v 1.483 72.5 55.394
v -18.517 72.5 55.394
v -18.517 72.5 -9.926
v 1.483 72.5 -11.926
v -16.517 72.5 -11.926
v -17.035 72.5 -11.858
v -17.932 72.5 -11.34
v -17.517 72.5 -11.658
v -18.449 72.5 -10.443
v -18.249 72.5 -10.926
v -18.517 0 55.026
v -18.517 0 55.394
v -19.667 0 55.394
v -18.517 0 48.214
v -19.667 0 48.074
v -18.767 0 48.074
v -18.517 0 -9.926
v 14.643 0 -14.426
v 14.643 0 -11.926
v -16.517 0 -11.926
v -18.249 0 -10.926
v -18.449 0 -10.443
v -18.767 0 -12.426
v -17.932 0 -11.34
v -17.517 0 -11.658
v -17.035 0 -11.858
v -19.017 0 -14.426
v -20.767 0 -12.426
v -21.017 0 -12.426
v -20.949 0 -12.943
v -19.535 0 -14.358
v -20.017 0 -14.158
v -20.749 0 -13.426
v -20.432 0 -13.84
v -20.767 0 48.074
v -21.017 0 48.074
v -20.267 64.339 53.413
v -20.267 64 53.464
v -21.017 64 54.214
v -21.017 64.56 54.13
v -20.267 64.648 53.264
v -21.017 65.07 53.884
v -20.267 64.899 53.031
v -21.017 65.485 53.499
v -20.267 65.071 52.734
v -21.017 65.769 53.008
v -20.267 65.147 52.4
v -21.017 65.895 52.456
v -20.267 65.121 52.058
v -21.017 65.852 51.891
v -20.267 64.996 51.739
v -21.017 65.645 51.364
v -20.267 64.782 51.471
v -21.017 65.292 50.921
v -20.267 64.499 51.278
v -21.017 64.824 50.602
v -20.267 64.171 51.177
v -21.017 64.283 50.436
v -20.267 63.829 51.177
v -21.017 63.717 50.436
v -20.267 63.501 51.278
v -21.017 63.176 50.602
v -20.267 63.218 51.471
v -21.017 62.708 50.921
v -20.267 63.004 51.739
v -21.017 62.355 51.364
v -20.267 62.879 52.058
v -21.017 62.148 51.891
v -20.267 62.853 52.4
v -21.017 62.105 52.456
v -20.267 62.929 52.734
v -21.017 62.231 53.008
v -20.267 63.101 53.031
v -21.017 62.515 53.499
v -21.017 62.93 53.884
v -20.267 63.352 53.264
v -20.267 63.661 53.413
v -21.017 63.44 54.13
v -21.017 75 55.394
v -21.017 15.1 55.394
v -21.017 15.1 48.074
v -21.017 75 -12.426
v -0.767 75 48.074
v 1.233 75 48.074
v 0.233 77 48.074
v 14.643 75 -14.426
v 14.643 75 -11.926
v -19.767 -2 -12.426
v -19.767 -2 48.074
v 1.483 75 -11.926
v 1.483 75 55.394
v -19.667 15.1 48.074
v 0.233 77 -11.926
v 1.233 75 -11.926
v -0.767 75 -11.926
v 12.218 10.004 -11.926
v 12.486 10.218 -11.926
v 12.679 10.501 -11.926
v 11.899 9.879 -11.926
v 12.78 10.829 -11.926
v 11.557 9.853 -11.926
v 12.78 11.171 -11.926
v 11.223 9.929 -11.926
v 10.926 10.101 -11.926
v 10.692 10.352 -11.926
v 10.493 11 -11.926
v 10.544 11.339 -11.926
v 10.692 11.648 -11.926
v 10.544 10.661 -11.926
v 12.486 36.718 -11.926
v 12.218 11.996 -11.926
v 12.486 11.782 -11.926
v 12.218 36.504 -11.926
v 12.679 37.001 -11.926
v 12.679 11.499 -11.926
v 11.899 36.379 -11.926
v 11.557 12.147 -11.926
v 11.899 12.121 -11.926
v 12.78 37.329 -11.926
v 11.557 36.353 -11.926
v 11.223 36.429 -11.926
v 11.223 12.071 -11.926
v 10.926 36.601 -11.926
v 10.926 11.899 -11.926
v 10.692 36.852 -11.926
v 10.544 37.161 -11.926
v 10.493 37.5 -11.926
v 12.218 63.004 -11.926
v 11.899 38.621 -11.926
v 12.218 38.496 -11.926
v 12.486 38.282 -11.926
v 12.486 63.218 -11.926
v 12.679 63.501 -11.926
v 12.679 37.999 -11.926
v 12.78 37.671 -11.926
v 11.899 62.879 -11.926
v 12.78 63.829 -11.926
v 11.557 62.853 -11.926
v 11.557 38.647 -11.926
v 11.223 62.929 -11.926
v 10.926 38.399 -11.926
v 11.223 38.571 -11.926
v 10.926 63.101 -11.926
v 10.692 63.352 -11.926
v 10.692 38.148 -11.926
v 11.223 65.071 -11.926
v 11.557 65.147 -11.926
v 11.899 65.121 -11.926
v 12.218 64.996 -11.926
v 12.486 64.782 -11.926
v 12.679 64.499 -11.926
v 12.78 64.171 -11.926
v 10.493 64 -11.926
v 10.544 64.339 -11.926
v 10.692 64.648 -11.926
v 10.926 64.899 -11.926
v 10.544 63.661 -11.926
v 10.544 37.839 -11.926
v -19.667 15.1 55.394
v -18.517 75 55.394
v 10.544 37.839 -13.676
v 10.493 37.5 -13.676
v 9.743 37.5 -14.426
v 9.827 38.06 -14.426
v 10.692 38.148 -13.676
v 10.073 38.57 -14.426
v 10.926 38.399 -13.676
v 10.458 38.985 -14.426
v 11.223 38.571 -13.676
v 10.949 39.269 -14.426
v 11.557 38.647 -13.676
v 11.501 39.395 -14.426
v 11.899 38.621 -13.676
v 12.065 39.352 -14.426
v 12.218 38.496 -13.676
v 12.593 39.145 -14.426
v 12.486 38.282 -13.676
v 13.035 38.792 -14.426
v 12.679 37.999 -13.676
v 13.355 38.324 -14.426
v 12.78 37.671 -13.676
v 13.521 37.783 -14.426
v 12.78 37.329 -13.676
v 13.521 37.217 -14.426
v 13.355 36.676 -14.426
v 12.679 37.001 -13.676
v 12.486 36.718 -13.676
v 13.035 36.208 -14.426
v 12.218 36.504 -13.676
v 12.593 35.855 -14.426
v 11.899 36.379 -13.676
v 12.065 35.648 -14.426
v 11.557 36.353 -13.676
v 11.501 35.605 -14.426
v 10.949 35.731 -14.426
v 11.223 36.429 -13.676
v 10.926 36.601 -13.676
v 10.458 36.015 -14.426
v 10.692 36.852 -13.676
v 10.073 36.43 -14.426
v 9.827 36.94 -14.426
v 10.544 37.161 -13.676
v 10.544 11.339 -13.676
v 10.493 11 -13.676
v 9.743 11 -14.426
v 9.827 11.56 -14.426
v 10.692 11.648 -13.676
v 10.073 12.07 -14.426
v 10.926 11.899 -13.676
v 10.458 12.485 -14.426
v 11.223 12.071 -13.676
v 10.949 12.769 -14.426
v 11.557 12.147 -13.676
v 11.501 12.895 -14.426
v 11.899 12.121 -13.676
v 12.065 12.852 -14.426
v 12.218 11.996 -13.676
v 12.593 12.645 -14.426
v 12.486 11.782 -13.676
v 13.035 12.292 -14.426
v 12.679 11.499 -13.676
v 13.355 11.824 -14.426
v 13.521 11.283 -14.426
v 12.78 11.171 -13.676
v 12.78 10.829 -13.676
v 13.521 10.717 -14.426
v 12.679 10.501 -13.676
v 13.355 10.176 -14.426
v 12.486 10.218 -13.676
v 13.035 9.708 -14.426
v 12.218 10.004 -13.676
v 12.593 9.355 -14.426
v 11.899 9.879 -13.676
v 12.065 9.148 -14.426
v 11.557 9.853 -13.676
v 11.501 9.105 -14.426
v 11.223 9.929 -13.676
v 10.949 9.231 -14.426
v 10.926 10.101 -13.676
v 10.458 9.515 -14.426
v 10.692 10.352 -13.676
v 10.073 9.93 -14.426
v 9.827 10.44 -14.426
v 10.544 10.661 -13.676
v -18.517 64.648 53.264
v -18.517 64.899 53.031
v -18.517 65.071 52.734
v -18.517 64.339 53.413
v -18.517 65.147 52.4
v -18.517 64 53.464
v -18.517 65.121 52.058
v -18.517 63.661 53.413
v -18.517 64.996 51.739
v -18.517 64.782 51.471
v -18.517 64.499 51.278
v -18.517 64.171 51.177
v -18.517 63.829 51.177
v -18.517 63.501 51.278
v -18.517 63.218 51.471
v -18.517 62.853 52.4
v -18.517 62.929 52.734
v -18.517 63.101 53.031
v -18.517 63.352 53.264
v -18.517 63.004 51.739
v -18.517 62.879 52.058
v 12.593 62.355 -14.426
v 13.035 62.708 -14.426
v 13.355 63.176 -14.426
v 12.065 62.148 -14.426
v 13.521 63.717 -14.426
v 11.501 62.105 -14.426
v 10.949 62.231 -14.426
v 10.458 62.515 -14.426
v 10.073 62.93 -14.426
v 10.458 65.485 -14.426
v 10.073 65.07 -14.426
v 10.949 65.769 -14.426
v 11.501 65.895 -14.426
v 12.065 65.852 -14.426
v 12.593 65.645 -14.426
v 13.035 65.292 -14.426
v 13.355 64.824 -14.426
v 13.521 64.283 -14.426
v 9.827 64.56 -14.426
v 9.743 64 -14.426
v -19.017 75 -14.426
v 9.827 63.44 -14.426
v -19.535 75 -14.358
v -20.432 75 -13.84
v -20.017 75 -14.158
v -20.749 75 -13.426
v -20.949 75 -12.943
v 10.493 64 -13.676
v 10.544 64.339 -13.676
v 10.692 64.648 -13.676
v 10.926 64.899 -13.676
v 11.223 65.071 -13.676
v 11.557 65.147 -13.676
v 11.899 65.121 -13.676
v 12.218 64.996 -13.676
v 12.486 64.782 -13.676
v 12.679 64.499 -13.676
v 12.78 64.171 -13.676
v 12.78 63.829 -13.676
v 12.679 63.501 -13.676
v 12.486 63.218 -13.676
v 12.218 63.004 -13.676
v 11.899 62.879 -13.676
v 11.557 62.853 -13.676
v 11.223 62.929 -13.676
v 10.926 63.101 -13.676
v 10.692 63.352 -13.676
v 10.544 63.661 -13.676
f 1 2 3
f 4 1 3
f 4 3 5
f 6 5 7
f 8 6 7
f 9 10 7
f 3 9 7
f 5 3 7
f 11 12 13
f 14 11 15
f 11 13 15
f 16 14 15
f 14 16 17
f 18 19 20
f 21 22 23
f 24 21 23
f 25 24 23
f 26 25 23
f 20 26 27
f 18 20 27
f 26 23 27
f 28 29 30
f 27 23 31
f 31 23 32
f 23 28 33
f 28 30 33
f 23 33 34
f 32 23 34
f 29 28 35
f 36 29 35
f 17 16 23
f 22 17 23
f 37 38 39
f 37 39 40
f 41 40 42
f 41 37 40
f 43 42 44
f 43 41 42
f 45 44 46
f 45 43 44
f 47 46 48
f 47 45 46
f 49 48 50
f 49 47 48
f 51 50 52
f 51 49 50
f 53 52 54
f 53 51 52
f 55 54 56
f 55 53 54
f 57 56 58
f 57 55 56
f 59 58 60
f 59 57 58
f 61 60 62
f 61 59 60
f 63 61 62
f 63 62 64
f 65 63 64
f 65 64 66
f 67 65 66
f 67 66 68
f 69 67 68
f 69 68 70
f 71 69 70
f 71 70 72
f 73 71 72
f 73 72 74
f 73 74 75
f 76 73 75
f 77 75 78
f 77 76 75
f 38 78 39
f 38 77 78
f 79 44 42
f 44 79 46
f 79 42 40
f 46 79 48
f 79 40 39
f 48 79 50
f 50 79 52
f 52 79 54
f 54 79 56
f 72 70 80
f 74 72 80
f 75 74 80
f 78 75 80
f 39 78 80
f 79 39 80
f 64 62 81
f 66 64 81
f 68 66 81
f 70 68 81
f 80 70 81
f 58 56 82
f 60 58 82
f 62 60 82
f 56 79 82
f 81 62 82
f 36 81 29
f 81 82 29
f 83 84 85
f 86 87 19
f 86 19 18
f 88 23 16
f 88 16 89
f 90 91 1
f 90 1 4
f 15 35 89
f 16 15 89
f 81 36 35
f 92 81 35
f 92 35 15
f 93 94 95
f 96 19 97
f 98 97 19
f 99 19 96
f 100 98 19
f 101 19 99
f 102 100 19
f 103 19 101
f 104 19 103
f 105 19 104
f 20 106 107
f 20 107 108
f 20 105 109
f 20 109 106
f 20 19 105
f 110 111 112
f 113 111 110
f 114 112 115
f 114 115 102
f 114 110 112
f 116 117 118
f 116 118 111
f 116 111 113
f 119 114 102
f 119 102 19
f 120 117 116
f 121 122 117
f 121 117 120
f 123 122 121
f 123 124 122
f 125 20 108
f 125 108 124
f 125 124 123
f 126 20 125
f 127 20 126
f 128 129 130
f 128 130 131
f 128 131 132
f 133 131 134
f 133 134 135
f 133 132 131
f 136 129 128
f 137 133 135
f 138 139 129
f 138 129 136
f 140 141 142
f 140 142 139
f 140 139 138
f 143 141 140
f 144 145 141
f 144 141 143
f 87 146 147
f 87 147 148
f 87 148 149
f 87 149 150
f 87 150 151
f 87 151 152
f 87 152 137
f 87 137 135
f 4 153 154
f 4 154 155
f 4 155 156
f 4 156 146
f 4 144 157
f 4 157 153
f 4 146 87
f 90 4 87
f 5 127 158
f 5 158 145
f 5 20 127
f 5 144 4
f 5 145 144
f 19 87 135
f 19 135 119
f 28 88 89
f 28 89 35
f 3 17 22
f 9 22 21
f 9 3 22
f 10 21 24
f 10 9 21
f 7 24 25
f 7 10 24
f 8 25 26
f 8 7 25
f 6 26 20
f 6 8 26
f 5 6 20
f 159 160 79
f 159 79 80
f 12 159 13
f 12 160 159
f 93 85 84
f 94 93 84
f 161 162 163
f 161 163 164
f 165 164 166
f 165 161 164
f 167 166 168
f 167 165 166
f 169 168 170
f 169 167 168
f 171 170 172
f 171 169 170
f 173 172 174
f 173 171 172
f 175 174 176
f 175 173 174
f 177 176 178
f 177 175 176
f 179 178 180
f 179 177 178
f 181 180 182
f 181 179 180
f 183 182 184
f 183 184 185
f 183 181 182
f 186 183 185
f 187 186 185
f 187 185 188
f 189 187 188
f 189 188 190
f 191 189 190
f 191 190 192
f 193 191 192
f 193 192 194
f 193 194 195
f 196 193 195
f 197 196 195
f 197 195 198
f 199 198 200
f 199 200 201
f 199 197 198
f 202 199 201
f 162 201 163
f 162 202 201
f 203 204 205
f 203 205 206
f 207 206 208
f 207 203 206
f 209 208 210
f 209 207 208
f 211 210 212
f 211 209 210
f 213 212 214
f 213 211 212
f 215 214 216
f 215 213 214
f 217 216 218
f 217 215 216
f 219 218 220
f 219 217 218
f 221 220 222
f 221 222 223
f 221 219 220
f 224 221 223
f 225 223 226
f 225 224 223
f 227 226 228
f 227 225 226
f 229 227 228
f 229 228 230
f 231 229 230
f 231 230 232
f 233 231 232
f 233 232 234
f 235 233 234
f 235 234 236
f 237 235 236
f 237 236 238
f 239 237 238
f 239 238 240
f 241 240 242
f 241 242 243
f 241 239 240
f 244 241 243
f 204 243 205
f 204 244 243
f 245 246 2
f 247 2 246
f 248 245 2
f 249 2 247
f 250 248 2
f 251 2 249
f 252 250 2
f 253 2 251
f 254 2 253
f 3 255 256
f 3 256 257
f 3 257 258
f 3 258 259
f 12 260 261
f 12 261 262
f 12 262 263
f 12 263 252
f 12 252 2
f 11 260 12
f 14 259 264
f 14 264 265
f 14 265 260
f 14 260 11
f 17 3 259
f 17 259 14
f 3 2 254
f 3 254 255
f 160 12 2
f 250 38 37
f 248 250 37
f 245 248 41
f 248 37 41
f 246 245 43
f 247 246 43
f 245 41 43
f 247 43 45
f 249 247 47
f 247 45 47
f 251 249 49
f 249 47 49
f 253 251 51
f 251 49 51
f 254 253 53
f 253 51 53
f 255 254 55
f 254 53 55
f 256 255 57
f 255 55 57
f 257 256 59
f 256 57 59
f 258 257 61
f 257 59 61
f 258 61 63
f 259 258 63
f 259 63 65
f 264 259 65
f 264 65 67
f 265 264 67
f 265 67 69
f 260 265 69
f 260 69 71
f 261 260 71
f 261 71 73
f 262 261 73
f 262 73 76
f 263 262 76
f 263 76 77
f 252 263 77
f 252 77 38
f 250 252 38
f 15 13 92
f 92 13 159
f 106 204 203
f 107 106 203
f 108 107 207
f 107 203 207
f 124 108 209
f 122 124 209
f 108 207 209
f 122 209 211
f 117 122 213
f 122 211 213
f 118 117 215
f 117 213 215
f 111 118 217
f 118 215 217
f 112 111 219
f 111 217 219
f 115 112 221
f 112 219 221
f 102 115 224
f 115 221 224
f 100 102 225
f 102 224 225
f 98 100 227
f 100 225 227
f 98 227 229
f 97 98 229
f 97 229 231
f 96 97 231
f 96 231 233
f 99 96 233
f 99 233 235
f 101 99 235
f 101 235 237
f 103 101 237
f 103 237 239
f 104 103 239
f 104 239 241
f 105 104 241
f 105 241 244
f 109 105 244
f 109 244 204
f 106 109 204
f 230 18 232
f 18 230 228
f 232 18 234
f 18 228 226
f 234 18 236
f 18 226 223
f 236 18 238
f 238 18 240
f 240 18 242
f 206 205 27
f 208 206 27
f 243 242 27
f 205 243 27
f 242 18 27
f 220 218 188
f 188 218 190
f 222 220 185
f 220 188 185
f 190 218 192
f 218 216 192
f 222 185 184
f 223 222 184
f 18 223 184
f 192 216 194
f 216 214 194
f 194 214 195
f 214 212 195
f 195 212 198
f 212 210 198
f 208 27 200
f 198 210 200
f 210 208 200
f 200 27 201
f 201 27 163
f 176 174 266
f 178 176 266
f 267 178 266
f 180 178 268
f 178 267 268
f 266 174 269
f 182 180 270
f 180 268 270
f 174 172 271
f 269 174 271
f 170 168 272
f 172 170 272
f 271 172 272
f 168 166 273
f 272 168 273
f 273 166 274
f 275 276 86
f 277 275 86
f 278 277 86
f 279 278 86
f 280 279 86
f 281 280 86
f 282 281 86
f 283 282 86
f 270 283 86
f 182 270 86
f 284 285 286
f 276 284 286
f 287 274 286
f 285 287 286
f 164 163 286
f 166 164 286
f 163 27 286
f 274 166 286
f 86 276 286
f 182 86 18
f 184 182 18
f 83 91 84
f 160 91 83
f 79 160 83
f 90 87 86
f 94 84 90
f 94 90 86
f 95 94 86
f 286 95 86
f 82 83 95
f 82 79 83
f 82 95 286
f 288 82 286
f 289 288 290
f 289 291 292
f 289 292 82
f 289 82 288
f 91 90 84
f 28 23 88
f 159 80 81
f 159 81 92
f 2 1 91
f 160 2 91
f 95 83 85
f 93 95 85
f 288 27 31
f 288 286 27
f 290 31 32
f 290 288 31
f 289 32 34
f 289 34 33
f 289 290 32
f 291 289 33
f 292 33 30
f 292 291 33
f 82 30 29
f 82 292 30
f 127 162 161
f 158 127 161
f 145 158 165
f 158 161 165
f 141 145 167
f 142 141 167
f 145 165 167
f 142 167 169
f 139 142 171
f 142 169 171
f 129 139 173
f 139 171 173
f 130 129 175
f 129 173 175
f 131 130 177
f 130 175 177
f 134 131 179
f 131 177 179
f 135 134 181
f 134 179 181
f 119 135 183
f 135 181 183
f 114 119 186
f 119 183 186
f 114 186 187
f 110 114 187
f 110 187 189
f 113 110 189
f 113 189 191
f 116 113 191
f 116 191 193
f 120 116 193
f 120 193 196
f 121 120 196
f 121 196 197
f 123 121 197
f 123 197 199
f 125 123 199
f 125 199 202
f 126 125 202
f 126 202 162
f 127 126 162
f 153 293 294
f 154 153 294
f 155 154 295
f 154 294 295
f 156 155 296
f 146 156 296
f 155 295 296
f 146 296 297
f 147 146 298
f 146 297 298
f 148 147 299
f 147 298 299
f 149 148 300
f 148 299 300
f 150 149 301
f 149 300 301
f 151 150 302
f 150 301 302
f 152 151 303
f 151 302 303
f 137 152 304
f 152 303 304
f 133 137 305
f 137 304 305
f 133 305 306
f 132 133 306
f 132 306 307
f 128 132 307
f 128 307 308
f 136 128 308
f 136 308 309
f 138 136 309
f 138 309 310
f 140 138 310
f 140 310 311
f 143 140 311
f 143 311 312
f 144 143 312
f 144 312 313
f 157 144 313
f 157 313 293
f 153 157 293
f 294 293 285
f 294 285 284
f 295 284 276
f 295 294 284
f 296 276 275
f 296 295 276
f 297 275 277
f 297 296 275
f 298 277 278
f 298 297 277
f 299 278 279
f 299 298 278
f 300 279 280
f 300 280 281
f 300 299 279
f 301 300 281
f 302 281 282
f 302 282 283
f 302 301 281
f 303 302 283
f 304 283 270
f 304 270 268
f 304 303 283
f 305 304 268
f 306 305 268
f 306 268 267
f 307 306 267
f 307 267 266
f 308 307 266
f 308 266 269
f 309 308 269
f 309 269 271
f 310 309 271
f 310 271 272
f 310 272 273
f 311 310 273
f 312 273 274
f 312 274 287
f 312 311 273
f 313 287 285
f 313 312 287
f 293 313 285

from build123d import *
from OCP.BRepAlgoAPI import BRepAlgoAPI_Cut
from OCP.TopTools import TopTools_ListOfShape

# Parameters (mm, degrees)
BOSS_EXTRUDE1_DEPTH = 75
FILLET1_R           = 2
SKETCH4_W           = 25.830037715
SKETCH4_H           = 76.964783177
CUT_EXTRUDE3_DEPTH  = 10
SKETCH7_W           = 75
SKETCH7_H           = 2.5
BOSS_EXTRUDE2_DEPTH = 7.180004
SKETCH9_W           = 2.5
SKETCH9_H           = 75
BOSS_EXTRUDE3_DEPTH = 20
SKETCH10_W          = 68.5
SKETCH10_H          = 2.5
BOSS_EXTRUDE4_DEPTH = 20
BOSS_EXTRUDE5_START = -67.82
BOSS_EXTRUDE5_DEPTH = 67.82
CUT_EXTRUDE4_DEPTH  = 7.32
SKETCH13_W          = 1.35
SKETCH13_H          = 15.1
CUT_EXTRUDE5_DEPTH  = 7.32
SKETCH15_R          = 1.15
CUT_EXTRUDE6_DEPTH  = 7.32
SKETCH16_R          = 1.15
CUT_EXTRUDE7_DEPTH  = 7.32
BOSS_EXTRUDE8_DEPTH = 59.999996
CHAMFER1_SIZE       = 0.75
CHAMFER2_SIZE       = 0.75


with BuildPart() as part:
    # Sketch1 → Boss-Extrude1 (new body)
    with BuildSketch(Plane(origin=(0, 0, 0), x_dir=(1, 0, 0), z_dir=(0, 1, 0))):
        with BuildLine():
            Line((-20.27294978, -55.394285714), (-17.826119678, -54.881428571))
            ThreePointArc((-17.826119678, -54.881428571), (-18.344064324, -51.565724334), (-18.517328344, -48.214285714))
            Line((-18.517328344, -48.214285714), (-18.517328344, 11.925714286))
            Line((-18.517328344, 11.925714286), (-5.357328344, 11.925714286))
            Line((-5.357328344, 11.925714286), (-5.357328344, 14.425714286))
            Line((-5.357328344, 14.425714286), (-21.017328344, 14.425714286))
            Line((-21.017328344, 14.425714286), (-21.017328344, -48.214285714))
            ThreePointArc((-21.017328344, -48.214285714), (-20.830736323, -51.823527305), (-20.27294978, -55.394285714))
        make_face()
    extrude(amount=BOSS_EXTRUDE1_DEPTH)

    # Fillet1
    fillet1_edges = [part.edges().sort_by_distance(p)[0] for p in [
        (-21.017328344, 37.5, -14.425714286),
        (-18.517328344, 37.5, -11.925714286),
    ]]
    fillet(fillet1_edges, radius=FILLET1_R)

    # Sketch4 → Cut-Extrude3 (cut)
    with BuildSketch(Plane(origin=(-18.517328344, 0, 0), x_dir=(0, 0, -1), z_dir=(1, 0, 0))):
        with Locations((-51.201481413, 38.482391589)):
            Rectangle(SKETCH4_W, SKETCH4_H)
    extrude(amount=CUT_EXTRUDE3_DEPTH, mode=Mode.SUBTRACT)

    # Sketch7 → Boss-Extrude2 (add)
    with BuildSketch(Plane(origin=(0, 0, 48.214285714), x_dir=(0, -1, 0), z_dir=(0, 0, 1))):
        with Locations((-37.5, -19.767328344)):
            Rectangle(SKETCH7_W, SKETCH7_H)
    extrude(amount=BOSS_EXTRUDE2_DEPTH)

    # Sketch9 → Boss-Extrude3 (add)
    with BuildSketch(Plane(origin=(-5.357328344, 0, 0), x_dir=(0, 0, -1), z_dir=(1, 0, 0))):
        with Locations((13.175714286, 37.5)):
            Rectangle(SKETCH9_W, SKETCH9_H)
    extrude(amount=BOSS_EXTRUDE3_DEPTH)

    # Sketch10 → Boss-Extrude4 (add)
    with BuildSketch(Plane(origin=(-18.517328344, 0, 0), x_dir=(0, 0, -1), z_dir=(1, 0, 0))):
        with Locations((-21.144285714, 73.75)):
            Rectangle(SKETCH10_W, SKETCH10_H)
    extrude(amount=BOSS_EXTRUDE4_DEPTH)

    # Sketch11 → Boss-Extrude5 (add)
    with BuildSketch(Plane.XY.offset(55.394285714).offset(BOSS_EXTRUDE5_START)):
        Polygon((-20.767328344, 0), (-18.767328344, 0), (-19.767328344, -2), align=None)
    extrude(amount=BOSS_EXTRUDE5_DEPTH)

    # Sketch12 → Cut-Extrude4 (cut)
    with BuildSketch(Plane.XY.offset(55.394285714)):
        Polygon((-20.767328344, 0), (-18.767328344, 0), (-19.767328344, -2), align=None)
    extrude(amount=-CUT_EXTRUDE4_DEPTH, mode=Mode.SUBTRACT)


with BuildPart() as cut_extrude5_tool:
    # Sketch13 → Cut-Extrude5 (new body)
    with BuildSketch(Plane.XY.offset(55.394285714)):
        with Locations((-20.342328344, 7.55)):
            Rectangle(SKETCH13_W, SKETCH13_H)
    extrude(amount=-CUT_EXTRUDE5_DEPTH)


with BuildPart() as part_1:
    add(part.part)

    # Cut-Extrude5: cut by cut_extrude5_tool, with a tolerance
    cut_extrude5_stock = TopTools_ListOfShape()
    cut_extrude5_stock.Append(part_1.part.wrapped)
    cut_extrude5_tools = TopTools_ListOfShape()
    cut_extrude5_tools.Append(cut_extrude5_tool.part.wrapped)
    cut_extrude5_cut = BRepAlgoAPI_Cut()
    cut_extrude5_cut.SetArguments(cut_extrude5_stock)
    cut_extrude5_cut.SetTools(cut_extrude5_tools)
    cut_extrude5_cut.SetFuzzyValue(0.00001)
    cut_extrude5_cut.Build()
    add(Compound.cast(cut_extrude5_cut.Shape()).solids(), mode=Mode.REPLACE)

    # Sketch15 → Cut-Extrude6 (cut)
    with BuildSketch(Plane(origin=(0, 0, -14.425714286), x_dir=(-1, 0, 0), z_dir=(0, 0, -1))):
        with Locations((-11.642671656, 64)):
            Circle(SKETCH15_R)
        with Locations((-11.642671656, 37.5)):
            Circle(SKETCH15_R)
        with Locations((-11.642671656, 11)):
            Circle(SKETCH15_R)
    extrude(amount=-CUT_EXTRUDE6_DEPTH, mode=Mode.SUBTRACT)

    # Sketch16 → Cut-Extrude7 (cut)
    with BuildSketch(Plane.ZY.offset(21.017328344)):
        with Locations((52.314285714, 64)):
            Circle(SKETCH16_R)
    extrude(amount=-CUT_EXTRUDE7_DEPTH, mode=Mode.SUBTRACT)

    # Sketch14 → Boss-Extrude8 (add)
    with BuildSketch(Plane.XY.offset(48.074285714)):
        Polygon((1.232671656, 75), (-0.767328344, 75), (0.232671656, 77), align=None)
    extrude(amount=-BOSS_EXTRUDE8_DEPTH)

    # Chamfer1
    chamfer1_edges = [part_1.edges().sort_by_distance(p)[0] for p in [
        (-21.017328344, 64, 51.164285714),
    ]]
    chamfer(chamfer1_edges, length=CHAMFER1_SIZE)

    # Chamfer2
    chamfer2_edges = [part_1.edges().sort_by_distance(p)[0] for p in [
        (12.792671656, 64, -14.425714286),
        (12.792671656, 37.5, -14.425714286),
        (12.792671656, 11, -14.425714286),
    ]]
    chamfer(chamfer2_edges, length=CHAMFER2_SIZE)


solid = part_1.part
